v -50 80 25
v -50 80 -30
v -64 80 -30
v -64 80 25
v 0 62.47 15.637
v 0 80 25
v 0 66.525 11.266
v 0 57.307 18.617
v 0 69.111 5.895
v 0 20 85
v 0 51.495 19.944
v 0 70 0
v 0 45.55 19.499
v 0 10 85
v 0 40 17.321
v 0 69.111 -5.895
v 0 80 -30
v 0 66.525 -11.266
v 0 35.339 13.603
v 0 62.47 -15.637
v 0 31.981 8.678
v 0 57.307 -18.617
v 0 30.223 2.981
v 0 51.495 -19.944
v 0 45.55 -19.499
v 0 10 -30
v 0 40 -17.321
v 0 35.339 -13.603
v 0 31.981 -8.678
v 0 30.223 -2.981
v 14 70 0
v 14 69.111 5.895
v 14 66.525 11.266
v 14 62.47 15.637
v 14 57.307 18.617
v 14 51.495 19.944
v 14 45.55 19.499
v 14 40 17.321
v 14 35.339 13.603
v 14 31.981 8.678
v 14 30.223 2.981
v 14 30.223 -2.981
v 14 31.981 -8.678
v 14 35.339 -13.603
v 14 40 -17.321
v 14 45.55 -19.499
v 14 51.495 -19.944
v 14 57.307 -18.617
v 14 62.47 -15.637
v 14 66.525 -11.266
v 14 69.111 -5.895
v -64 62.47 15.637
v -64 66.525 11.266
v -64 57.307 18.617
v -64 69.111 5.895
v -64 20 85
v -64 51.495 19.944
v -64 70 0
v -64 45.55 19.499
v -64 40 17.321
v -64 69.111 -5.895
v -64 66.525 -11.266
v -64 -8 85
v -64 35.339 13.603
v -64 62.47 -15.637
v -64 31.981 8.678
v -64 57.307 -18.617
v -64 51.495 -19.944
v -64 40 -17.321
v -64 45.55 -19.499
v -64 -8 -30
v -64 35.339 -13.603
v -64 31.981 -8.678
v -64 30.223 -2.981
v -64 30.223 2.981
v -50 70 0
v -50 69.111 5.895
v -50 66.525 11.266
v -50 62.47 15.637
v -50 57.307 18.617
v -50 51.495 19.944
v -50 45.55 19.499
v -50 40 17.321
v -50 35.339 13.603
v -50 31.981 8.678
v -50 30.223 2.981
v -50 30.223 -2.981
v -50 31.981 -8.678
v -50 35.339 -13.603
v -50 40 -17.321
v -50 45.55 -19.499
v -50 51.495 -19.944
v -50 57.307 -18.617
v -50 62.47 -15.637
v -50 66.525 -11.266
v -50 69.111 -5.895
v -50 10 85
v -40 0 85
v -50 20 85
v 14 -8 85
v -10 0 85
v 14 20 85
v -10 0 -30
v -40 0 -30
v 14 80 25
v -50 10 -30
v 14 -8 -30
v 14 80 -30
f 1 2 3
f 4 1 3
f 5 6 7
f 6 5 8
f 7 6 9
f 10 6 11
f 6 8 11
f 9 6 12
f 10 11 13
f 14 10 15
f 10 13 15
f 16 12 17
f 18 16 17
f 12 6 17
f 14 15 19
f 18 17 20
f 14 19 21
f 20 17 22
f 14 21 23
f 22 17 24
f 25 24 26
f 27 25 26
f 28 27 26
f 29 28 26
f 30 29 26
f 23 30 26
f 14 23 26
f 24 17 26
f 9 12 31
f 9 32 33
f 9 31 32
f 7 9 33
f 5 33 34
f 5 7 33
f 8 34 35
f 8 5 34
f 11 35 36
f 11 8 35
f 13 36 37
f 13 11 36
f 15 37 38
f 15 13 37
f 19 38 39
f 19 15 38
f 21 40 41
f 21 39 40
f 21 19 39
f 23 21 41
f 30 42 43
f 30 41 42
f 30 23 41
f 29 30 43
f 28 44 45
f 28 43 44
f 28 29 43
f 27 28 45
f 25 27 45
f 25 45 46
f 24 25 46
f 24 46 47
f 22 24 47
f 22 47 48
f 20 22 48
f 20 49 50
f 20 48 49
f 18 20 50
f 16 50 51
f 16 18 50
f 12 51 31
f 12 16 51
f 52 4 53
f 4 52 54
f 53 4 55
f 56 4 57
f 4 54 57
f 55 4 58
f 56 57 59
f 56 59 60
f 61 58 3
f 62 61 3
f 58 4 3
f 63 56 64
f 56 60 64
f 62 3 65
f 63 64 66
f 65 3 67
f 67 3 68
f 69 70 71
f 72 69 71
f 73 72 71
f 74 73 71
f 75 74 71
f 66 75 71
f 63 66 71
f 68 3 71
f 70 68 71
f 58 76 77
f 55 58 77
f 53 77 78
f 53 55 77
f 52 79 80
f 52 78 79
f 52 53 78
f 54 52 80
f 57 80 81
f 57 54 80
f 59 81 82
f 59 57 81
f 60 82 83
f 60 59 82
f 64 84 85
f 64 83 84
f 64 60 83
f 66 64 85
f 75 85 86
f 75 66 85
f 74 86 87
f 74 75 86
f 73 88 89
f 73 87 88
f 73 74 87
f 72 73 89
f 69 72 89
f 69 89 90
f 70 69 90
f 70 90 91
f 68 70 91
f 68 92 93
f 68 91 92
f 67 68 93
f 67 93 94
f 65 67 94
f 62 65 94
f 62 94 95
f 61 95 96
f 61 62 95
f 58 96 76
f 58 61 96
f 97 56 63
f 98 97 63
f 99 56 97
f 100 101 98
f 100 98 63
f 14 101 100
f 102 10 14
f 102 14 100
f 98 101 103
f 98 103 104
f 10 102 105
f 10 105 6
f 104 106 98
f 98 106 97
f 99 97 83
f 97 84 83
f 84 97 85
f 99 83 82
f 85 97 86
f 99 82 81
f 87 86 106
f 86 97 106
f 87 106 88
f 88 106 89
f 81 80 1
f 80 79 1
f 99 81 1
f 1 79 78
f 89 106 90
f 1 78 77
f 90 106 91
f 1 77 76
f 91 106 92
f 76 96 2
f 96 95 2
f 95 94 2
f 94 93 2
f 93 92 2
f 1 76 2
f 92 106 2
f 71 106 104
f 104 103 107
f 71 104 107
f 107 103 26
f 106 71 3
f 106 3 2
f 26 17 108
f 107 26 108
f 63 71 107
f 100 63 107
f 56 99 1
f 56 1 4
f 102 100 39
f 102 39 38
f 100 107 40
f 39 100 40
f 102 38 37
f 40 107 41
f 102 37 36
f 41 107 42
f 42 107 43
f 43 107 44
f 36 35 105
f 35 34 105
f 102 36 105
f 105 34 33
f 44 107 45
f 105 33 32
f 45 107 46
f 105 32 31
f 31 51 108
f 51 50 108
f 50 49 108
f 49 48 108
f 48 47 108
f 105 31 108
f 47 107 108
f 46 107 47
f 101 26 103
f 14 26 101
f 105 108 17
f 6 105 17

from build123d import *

# Parameters (mm, degrees)
BOSS_EXTRUDE1_DEPTH      = 85
BOSS_EXTRUDE1_DEPTH_BACK = 30
CUT_EXTRUDE1_DEPTH       = 134.120246394
CUT_EXTRUDE1_DEPTH_BACK  = 134.120246394
SKETCH3_R                = 20
CHAMFER1_SIZE            = 10
CHAMFER2_SIZE            = 60


with BuildPart() as part:
    # Sketch2 → Boss-Extrude1 (new, two sides: drawn at the far end of the back side and taken through both)
    with BuildSketch(Plane.XY.offset(-BOSS_EXTRUDE1_DEPTH_BACK)):
        Polygon((0, 0), (-50, 0), (-50, 80), (-64, 80), (-64, -8), (14, -8), (14, 80), (0, 80), align=None)
    extrude(amount=BOSS_EXTRUDE1_DEPTH + BOSS_EXTRUDE1_DEPTH_BACK)

    # Sketch3 → Cut-Extrude1 (cut, two sides: drawn at the far end of the back side and taken through both)
    with BuildSketch(Plane(origin=(0, 0, 0), x_dir=(0, 0, -1), z_dir=(1, 0, 0)).offset(-CUT_EXTRUDE1_DEPTH_BACK)):
        with Locations(Location((0, 50, 0), (0, 0, 90))):
            Circle(SKETCH3_R)
    extrude(amount=CUT_EXTRUDE1_DEPTH + CUT_EXTRUDE1_DEPTH_BACK, mode=Mode.SUBTRACT)

    # Chamfer1
    chamfer1_edges = [part.edges().sort_by_distance(p)[0] for p in [
        (-50, 0, 27.5),
        (0, 0, 27.5),
    ]]
    chamfer(chamfer1_edges, length=CHAMFER1_SIZE)

    # Chamfer2
    chamfer2_edges = [part.edges().sort_by_distance(p)[0] for p in [
        (-57, 80, 85),
        (7, 80, 85),
    ]]
    chamfer(chamfer2_edges, length=CHAMFER2_SIZE)


solid = part.part
